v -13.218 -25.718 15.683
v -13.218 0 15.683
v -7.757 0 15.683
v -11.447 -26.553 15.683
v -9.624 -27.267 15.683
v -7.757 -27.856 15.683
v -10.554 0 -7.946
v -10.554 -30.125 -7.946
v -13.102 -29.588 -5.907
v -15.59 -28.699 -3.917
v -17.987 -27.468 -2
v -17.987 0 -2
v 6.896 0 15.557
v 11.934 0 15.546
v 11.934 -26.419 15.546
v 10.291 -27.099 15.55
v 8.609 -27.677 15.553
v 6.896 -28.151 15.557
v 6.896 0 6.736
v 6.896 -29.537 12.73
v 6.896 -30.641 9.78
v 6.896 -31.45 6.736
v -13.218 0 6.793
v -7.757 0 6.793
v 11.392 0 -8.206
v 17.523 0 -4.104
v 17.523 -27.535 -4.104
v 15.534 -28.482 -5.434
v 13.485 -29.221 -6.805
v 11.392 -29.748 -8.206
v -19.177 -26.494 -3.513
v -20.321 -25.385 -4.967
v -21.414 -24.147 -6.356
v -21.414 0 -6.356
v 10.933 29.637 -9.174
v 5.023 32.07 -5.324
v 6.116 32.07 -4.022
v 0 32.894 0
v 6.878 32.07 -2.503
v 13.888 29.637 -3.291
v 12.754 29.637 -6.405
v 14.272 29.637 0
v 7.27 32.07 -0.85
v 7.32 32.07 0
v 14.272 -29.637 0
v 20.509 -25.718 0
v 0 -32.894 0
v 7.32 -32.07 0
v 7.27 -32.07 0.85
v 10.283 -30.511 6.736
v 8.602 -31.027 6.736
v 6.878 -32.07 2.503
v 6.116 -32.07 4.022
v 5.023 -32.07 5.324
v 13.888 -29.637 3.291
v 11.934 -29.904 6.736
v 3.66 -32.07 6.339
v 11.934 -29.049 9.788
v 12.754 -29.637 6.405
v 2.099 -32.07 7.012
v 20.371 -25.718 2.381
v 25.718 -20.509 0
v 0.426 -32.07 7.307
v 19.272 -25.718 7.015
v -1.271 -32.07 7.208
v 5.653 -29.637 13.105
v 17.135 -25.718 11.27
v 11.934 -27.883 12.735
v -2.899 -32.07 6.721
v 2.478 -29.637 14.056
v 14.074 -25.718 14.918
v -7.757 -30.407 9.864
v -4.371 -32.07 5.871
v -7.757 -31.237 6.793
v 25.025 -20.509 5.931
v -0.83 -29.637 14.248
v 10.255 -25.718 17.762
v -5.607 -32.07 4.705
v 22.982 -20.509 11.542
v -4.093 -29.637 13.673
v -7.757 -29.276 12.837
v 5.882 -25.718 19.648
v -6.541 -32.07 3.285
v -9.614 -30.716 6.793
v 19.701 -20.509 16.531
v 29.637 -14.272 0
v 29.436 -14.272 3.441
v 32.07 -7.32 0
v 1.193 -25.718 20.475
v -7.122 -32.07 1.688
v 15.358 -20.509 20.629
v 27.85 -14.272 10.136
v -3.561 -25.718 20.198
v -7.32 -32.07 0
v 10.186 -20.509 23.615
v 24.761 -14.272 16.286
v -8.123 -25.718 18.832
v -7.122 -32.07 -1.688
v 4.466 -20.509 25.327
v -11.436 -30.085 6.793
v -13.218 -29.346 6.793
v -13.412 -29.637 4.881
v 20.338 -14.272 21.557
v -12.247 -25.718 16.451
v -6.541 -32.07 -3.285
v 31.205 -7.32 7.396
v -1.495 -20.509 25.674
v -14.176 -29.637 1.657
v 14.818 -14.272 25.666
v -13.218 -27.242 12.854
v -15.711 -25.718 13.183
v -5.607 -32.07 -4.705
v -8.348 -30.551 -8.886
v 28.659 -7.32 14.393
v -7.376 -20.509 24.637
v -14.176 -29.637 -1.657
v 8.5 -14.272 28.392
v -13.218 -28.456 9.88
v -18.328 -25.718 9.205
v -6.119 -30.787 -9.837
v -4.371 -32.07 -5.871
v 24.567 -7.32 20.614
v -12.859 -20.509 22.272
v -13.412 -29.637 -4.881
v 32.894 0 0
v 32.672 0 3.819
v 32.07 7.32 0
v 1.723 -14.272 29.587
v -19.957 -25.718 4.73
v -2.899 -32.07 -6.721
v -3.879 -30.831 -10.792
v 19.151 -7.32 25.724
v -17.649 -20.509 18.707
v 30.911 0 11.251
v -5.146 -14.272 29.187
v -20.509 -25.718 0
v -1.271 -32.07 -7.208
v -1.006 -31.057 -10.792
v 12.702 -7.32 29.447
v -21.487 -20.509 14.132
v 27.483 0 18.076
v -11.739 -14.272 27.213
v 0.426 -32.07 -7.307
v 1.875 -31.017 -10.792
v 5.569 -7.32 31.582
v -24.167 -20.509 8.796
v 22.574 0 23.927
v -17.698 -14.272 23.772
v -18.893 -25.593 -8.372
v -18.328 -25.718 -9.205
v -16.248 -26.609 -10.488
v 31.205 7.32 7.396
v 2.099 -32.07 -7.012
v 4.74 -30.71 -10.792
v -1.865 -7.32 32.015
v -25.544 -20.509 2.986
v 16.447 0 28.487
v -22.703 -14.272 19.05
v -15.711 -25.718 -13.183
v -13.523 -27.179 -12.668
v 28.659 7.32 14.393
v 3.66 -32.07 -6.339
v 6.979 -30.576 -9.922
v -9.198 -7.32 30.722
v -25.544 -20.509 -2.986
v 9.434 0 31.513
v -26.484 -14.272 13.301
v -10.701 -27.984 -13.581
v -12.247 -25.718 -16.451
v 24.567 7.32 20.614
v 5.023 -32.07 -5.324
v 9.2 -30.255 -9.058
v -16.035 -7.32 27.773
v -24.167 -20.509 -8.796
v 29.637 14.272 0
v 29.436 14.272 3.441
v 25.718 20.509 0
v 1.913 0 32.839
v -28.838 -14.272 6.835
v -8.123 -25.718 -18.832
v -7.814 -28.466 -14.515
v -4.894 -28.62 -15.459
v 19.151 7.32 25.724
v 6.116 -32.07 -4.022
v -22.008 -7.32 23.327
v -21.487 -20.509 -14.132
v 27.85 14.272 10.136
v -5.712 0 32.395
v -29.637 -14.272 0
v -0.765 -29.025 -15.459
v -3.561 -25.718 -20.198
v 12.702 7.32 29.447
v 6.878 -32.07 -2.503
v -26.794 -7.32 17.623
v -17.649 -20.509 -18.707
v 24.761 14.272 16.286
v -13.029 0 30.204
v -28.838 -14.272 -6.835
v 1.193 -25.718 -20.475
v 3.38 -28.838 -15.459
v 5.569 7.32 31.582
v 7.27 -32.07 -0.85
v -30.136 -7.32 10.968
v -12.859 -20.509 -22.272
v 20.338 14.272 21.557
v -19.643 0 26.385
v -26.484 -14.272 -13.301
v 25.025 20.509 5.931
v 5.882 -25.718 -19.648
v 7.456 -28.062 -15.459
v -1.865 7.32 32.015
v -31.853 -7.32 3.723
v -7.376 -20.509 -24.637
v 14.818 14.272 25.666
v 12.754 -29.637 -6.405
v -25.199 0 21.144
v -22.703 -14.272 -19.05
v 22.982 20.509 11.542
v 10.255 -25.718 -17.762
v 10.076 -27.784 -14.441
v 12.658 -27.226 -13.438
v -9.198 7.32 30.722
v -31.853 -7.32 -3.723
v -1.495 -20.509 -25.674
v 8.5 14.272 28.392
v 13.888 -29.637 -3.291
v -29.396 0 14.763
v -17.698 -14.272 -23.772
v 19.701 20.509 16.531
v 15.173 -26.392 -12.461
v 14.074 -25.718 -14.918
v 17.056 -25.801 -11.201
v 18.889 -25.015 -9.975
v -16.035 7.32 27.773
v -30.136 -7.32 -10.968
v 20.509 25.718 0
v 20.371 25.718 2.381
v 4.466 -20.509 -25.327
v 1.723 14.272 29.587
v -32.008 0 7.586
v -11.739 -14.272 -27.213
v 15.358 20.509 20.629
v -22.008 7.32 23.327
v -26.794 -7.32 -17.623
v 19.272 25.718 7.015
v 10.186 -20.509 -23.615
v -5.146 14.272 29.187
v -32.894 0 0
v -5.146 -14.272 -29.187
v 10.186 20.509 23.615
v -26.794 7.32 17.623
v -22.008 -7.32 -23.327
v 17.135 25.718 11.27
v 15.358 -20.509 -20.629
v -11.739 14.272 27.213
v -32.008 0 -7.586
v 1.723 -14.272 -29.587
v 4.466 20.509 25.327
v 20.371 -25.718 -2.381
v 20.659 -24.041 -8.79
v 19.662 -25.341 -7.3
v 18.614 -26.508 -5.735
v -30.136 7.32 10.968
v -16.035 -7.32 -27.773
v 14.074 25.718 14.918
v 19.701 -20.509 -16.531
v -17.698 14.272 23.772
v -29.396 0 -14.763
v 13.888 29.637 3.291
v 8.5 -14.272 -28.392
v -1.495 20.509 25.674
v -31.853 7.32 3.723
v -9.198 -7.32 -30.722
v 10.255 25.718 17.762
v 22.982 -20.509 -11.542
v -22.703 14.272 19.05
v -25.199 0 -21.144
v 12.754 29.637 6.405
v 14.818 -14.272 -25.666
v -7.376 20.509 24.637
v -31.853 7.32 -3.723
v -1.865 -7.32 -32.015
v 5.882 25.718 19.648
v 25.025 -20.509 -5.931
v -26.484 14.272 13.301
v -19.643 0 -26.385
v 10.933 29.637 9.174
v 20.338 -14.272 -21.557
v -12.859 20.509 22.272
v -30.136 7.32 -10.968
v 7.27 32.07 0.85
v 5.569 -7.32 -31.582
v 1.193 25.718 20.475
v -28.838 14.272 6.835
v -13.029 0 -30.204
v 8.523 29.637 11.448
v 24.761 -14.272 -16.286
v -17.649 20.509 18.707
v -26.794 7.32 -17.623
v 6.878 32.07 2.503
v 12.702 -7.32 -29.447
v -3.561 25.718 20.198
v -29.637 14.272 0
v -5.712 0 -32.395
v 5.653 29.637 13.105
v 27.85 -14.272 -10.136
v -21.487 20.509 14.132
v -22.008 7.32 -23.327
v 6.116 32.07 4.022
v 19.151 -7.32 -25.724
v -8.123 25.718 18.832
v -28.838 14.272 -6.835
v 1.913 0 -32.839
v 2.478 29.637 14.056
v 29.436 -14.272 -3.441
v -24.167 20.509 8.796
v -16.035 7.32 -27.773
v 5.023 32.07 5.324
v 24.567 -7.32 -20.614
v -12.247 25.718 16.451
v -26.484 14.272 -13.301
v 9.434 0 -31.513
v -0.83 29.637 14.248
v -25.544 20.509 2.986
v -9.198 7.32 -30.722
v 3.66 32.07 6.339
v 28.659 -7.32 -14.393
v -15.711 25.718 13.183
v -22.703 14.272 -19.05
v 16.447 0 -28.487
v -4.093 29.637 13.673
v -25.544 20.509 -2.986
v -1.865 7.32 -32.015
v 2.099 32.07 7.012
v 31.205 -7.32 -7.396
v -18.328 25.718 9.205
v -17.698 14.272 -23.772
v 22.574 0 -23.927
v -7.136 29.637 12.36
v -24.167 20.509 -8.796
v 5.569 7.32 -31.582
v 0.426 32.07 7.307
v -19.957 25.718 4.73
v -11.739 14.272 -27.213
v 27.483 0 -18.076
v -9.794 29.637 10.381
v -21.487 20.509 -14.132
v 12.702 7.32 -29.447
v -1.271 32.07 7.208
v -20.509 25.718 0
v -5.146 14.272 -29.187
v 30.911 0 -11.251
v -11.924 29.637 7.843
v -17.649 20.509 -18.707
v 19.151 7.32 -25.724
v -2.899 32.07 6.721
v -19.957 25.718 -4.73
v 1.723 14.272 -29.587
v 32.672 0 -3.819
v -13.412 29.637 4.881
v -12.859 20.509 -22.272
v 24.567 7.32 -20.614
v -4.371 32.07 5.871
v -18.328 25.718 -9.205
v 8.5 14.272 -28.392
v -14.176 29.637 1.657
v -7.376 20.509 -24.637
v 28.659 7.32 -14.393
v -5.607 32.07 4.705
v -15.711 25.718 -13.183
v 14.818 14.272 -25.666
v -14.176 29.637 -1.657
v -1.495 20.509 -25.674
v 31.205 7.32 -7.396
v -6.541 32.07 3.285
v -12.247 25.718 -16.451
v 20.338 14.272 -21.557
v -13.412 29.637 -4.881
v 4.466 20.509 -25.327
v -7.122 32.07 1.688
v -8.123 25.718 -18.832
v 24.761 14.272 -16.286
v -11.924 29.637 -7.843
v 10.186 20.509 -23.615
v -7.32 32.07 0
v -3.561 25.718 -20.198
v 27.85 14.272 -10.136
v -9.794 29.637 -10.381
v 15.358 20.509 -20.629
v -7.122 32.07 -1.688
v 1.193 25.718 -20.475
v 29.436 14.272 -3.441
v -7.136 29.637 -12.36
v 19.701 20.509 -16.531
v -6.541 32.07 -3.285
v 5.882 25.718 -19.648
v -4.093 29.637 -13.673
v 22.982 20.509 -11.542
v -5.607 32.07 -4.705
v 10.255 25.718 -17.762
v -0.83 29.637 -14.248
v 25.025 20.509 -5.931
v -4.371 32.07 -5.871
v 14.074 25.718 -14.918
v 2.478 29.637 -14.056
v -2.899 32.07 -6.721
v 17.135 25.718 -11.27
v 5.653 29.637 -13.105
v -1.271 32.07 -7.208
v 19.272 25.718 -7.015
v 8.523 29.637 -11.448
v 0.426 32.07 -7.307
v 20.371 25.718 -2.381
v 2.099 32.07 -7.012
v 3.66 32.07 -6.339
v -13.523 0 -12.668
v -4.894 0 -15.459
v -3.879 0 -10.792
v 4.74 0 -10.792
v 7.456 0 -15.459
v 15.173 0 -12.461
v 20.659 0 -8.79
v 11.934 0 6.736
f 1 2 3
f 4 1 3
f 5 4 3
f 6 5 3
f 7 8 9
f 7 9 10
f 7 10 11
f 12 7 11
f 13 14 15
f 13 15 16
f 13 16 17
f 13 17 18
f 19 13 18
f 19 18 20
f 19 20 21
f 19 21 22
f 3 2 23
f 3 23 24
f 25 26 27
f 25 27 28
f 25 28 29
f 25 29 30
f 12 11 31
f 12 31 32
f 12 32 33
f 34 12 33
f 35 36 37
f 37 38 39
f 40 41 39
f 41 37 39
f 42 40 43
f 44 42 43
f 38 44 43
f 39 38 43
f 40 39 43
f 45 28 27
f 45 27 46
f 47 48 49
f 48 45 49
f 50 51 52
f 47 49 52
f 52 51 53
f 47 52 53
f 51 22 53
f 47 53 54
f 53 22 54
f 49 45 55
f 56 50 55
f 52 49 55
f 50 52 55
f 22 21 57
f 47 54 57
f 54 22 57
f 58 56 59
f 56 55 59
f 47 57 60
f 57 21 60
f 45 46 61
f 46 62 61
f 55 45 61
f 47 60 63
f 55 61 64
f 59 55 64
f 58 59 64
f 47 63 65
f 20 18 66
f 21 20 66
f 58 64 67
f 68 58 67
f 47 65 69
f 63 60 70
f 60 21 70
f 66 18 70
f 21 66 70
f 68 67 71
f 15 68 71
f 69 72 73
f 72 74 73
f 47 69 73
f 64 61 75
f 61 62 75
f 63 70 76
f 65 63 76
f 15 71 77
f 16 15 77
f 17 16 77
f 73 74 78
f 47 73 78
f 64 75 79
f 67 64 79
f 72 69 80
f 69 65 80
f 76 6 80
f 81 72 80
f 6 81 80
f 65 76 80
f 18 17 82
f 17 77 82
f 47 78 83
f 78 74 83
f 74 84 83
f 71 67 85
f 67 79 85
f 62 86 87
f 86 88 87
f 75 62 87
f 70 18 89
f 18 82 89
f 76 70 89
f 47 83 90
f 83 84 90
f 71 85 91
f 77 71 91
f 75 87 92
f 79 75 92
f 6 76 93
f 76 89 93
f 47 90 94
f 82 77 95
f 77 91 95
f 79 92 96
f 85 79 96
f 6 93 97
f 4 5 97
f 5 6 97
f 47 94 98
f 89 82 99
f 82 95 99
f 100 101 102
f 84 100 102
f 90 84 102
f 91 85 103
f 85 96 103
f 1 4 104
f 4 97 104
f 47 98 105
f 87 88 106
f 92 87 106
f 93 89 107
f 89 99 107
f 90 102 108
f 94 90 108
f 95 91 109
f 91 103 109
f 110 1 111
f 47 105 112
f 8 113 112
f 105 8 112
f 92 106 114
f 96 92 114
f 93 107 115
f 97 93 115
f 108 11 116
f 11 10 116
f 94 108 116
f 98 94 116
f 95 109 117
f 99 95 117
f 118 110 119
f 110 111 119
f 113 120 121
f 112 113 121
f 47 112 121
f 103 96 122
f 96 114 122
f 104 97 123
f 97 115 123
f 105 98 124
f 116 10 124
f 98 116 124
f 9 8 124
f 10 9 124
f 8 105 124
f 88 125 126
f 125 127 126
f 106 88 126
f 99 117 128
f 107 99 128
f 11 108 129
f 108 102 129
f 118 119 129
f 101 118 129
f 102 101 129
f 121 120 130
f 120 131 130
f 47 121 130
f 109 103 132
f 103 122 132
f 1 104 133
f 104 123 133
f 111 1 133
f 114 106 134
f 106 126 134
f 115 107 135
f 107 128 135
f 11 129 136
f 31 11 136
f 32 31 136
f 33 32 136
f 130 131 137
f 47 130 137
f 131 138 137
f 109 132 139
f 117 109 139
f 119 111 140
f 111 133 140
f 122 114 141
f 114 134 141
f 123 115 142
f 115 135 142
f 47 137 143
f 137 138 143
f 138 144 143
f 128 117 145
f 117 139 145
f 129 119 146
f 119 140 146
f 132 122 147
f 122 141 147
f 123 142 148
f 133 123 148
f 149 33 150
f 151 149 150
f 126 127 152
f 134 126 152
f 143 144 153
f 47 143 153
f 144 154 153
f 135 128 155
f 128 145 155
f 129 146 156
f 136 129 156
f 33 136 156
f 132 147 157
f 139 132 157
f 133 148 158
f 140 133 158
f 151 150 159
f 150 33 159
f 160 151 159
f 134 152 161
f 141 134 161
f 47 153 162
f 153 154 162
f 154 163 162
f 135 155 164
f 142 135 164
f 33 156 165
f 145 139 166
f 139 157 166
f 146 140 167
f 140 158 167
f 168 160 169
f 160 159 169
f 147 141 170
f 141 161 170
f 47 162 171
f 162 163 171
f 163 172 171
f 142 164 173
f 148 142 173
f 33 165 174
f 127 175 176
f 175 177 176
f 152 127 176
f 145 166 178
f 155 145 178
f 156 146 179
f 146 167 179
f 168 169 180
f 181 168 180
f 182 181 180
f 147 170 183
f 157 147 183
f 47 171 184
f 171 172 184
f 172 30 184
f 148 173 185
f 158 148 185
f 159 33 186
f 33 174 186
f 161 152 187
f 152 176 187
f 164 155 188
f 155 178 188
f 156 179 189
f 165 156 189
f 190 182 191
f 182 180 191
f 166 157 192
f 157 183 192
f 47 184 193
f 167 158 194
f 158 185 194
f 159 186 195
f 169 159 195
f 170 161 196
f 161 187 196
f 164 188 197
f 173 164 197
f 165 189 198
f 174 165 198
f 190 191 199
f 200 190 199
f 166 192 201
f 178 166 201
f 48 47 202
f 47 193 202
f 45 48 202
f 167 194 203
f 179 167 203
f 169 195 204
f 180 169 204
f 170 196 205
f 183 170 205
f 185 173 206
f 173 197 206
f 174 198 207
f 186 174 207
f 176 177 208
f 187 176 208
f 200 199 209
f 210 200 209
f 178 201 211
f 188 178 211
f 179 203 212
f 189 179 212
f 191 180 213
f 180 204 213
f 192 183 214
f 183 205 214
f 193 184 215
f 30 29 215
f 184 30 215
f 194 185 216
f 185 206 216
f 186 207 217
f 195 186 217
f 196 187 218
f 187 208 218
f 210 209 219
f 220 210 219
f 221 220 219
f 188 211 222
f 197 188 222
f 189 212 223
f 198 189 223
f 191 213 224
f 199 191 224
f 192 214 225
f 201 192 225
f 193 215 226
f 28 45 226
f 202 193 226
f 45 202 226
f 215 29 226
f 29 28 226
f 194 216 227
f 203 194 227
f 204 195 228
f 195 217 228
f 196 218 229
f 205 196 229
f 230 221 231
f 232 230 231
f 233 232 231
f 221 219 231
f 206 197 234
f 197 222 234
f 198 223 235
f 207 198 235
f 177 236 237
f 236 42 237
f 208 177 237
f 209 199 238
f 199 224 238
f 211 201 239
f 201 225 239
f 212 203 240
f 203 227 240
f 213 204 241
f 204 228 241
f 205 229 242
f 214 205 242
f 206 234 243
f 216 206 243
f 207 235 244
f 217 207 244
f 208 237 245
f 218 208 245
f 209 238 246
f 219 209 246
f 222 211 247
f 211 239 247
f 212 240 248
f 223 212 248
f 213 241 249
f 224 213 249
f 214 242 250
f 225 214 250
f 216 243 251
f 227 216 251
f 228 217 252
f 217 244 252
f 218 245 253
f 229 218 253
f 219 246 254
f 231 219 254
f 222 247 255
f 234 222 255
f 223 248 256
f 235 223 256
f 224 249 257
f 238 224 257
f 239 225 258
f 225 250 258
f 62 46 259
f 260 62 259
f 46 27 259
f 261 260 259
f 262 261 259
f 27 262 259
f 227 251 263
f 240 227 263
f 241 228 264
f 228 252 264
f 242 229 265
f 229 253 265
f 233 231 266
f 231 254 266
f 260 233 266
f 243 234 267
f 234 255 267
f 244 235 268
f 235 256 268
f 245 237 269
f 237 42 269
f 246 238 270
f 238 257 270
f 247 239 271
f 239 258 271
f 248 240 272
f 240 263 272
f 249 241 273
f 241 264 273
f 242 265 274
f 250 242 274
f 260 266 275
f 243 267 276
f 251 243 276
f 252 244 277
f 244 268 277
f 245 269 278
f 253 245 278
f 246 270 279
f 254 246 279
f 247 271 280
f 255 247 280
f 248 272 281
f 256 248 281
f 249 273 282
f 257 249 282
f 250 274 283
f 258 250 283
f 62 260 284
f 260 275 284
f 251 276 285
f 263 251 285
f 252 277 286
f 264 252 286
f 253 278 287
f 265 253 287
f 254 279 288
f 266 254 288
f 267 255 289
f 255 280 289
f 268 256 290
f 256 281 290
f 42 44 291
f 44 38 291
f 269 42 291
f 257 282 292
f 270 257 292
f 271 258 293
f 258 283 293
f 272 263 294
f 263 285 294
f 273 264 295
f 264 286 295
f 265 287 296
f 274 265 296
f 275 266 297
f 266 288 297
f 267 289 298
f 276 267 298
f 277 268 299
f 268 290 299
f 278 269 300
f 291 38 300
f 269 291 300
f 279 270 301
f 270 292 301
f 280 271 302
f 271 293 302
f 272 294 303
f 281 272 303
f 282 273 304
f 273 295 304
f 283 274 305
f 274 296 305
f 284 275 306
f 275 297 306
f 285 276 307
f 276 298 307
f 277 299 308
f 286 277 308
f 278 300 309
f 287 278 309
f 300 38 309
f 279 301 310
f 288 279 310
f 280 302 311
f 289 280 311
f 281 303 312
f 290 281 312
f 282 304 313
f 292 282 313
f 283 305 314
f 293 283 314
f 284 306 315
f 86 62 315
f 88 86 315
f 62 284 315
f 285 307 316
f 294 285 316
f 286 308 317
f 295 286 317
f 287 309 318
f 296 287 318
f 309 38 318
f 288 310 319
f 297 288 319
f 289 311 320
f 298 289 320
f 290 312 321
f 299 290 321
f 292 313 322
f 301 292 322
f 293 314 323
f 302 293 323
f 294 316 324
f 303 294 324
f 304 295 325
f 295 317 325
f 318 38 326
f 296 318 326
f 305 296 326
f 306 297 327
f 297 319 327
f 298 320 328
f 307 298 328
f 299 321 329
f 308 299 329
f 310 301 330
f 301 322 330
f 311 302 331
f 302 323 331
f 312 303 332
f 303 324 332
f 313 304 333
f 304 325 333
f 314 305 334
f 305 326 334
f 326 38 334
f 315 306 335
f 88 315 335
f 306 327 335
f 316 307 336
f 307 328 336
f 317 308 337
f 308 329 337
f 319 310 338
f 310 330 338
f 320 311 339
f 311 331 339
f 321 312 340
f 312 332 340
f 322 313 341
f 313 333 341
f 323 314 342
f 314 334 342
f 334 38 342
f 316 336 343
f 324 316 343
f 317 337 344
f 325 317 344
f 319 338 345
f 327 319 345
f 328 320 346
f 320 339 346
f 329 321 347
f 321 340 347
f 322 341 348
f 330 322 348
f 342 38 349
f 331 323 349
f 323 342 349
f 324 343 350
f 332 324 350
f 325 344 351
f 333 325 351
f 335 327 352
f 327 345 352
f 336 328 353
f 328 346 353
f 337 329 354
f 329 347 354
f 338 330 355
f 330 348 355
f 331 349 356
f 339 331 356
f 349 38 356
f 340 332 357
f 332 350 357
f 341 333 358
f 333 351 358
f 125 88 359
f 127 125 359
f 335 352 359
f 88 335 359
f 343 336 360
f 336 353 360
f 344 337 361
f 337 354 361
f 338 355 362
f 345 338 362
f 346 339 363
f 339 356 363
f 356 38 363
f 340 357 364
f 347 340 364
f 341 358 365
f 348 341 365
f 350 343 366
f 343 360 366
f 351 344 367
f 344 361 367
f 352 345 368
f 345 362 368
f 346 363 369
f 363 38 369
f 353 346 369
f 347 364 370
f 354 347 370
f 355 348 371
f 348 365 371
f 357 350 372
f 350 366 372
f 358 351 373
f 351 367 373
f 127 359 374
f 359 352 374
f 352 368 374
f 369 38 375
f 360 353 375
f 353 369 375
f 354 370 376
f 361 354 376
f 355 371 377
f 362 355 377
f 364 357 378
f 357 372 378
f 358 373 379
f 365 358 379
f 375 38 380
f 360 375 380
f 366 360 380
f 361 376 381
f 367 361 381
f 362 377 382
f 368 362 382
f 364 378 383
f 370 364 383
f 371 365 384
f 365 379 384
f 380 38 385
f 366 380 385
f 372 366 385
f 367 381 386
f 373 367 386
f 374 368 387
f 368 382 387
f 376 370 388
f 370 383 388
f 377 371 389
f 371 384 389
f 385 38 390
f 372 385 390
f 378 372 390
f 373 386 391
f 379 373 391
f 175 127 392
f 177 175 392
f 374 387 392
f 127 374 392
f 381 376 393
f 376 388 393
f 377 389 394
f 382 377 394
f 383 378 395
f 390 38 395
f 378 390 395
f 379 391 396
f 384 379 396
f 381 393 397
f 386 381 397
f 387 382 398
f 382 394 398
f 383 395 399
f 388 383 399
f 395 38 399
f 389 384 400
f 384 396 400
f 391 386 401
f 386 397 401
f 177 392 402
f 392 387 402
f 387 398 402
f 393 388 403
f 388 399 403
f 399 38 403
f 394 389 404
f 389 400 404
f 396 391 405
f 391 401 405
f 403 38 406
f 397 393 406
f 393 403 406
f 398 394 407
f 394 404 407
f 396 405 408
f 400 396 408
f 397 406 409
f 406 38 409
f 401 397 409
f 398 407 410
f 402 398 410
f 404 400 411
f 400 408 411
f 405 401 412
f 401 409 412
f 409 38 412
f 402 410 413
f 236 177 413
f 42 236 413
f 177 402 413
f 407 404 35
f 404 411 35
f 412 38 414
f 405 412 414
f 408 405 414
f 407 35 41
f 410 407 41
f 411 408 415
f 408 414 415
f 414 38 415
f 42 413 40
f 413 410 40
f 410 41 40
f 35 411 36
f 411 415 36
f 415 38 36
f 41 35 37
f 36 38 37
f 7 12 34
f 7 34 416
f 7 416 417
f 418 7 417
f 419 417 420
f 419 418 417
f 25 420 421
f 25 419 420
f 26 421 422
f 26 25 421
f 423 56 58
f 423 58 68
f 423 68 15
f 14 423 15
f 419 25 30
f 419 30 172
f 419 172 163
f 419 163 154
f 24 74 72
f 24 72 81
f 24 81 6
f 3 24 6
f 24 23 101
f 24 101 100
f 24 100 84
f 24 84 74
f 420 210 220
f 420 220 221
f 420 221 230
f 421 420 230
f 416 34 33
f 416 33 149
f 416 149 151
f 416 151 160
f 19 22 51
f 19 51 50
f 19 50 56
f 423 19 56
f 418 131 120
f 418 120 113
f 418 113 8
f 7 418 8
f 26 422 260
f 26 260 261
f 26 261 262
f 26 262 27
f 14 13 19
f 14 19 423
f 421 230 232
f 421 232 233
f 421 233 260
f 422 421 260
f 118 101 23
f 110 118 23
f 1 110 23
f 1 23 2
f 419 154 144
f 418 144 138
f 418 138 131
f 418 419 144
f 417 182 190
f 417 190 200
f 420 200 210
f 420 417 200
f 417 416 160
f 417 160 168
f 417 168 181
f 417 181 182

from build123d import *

# Parameters (mm, degrees)
F2_W     = 5.461
F2_H     = 8.89
F3_DEPTH = 32.895429
F5_DEPTH = 32.895429
F7_DEPTH = 32.895429


with BuildPart() as f1:
    # F0 (on Top) → F1 (revolve)
    with BuildSketch(Plane.XY):
        with BuildLine():
            Line((0, 32.894429), (0, -32.894429))
            ThreePointArc((0, -32.894429), (32.894429, 0), (0, 32.894429))
        make_face()
    revolve(axis=Axis((0, 0, 0), (0, -1, 0)))

    # F2 (on Front) → F3 (cut, through all)
    with BuildSketch(Plane.XZ):
        with Locations((-10.487013, 11.237753)):
            Rectangle(F2_W, F2_H)
    extrude(amount=F3_DEPTH, mode=Mode.SUBTRACT)

    # F4 (on Front) → F5 (cut, through all)
    with BuildSketch(Plane.XZ):
        Polygon((11.933651, 15.546253), (6.895673, 15.557211), (6.895673, 6.736375), (11.933651, 6.736375), align=None)
    extrude(amount=F5_DEPTH, mode=Mode.SUBTRACT)

    # F6 (on Front) → F7 (cut, through all)
    with BuildSketch(Plane.XZ):
        Polygon((-10.553785, -7.94562), (-17.987287, -1.999777), (-21.413613, -6.356075), (-13.522841, -12.667675), (-4.894031, -15.459277), (7.455942, -15.459277), (15.173362, -12.460908), (20.658924, -8.790475), (17.52286, -4.103541), (11.391848, -8.20585), (4.74029, -10.79227), (-3.879014, -10.79227), align=None)
    extrude(amount=F7_DEPTH, mode=Mode.SUBTRACT)


solid = f1.part
